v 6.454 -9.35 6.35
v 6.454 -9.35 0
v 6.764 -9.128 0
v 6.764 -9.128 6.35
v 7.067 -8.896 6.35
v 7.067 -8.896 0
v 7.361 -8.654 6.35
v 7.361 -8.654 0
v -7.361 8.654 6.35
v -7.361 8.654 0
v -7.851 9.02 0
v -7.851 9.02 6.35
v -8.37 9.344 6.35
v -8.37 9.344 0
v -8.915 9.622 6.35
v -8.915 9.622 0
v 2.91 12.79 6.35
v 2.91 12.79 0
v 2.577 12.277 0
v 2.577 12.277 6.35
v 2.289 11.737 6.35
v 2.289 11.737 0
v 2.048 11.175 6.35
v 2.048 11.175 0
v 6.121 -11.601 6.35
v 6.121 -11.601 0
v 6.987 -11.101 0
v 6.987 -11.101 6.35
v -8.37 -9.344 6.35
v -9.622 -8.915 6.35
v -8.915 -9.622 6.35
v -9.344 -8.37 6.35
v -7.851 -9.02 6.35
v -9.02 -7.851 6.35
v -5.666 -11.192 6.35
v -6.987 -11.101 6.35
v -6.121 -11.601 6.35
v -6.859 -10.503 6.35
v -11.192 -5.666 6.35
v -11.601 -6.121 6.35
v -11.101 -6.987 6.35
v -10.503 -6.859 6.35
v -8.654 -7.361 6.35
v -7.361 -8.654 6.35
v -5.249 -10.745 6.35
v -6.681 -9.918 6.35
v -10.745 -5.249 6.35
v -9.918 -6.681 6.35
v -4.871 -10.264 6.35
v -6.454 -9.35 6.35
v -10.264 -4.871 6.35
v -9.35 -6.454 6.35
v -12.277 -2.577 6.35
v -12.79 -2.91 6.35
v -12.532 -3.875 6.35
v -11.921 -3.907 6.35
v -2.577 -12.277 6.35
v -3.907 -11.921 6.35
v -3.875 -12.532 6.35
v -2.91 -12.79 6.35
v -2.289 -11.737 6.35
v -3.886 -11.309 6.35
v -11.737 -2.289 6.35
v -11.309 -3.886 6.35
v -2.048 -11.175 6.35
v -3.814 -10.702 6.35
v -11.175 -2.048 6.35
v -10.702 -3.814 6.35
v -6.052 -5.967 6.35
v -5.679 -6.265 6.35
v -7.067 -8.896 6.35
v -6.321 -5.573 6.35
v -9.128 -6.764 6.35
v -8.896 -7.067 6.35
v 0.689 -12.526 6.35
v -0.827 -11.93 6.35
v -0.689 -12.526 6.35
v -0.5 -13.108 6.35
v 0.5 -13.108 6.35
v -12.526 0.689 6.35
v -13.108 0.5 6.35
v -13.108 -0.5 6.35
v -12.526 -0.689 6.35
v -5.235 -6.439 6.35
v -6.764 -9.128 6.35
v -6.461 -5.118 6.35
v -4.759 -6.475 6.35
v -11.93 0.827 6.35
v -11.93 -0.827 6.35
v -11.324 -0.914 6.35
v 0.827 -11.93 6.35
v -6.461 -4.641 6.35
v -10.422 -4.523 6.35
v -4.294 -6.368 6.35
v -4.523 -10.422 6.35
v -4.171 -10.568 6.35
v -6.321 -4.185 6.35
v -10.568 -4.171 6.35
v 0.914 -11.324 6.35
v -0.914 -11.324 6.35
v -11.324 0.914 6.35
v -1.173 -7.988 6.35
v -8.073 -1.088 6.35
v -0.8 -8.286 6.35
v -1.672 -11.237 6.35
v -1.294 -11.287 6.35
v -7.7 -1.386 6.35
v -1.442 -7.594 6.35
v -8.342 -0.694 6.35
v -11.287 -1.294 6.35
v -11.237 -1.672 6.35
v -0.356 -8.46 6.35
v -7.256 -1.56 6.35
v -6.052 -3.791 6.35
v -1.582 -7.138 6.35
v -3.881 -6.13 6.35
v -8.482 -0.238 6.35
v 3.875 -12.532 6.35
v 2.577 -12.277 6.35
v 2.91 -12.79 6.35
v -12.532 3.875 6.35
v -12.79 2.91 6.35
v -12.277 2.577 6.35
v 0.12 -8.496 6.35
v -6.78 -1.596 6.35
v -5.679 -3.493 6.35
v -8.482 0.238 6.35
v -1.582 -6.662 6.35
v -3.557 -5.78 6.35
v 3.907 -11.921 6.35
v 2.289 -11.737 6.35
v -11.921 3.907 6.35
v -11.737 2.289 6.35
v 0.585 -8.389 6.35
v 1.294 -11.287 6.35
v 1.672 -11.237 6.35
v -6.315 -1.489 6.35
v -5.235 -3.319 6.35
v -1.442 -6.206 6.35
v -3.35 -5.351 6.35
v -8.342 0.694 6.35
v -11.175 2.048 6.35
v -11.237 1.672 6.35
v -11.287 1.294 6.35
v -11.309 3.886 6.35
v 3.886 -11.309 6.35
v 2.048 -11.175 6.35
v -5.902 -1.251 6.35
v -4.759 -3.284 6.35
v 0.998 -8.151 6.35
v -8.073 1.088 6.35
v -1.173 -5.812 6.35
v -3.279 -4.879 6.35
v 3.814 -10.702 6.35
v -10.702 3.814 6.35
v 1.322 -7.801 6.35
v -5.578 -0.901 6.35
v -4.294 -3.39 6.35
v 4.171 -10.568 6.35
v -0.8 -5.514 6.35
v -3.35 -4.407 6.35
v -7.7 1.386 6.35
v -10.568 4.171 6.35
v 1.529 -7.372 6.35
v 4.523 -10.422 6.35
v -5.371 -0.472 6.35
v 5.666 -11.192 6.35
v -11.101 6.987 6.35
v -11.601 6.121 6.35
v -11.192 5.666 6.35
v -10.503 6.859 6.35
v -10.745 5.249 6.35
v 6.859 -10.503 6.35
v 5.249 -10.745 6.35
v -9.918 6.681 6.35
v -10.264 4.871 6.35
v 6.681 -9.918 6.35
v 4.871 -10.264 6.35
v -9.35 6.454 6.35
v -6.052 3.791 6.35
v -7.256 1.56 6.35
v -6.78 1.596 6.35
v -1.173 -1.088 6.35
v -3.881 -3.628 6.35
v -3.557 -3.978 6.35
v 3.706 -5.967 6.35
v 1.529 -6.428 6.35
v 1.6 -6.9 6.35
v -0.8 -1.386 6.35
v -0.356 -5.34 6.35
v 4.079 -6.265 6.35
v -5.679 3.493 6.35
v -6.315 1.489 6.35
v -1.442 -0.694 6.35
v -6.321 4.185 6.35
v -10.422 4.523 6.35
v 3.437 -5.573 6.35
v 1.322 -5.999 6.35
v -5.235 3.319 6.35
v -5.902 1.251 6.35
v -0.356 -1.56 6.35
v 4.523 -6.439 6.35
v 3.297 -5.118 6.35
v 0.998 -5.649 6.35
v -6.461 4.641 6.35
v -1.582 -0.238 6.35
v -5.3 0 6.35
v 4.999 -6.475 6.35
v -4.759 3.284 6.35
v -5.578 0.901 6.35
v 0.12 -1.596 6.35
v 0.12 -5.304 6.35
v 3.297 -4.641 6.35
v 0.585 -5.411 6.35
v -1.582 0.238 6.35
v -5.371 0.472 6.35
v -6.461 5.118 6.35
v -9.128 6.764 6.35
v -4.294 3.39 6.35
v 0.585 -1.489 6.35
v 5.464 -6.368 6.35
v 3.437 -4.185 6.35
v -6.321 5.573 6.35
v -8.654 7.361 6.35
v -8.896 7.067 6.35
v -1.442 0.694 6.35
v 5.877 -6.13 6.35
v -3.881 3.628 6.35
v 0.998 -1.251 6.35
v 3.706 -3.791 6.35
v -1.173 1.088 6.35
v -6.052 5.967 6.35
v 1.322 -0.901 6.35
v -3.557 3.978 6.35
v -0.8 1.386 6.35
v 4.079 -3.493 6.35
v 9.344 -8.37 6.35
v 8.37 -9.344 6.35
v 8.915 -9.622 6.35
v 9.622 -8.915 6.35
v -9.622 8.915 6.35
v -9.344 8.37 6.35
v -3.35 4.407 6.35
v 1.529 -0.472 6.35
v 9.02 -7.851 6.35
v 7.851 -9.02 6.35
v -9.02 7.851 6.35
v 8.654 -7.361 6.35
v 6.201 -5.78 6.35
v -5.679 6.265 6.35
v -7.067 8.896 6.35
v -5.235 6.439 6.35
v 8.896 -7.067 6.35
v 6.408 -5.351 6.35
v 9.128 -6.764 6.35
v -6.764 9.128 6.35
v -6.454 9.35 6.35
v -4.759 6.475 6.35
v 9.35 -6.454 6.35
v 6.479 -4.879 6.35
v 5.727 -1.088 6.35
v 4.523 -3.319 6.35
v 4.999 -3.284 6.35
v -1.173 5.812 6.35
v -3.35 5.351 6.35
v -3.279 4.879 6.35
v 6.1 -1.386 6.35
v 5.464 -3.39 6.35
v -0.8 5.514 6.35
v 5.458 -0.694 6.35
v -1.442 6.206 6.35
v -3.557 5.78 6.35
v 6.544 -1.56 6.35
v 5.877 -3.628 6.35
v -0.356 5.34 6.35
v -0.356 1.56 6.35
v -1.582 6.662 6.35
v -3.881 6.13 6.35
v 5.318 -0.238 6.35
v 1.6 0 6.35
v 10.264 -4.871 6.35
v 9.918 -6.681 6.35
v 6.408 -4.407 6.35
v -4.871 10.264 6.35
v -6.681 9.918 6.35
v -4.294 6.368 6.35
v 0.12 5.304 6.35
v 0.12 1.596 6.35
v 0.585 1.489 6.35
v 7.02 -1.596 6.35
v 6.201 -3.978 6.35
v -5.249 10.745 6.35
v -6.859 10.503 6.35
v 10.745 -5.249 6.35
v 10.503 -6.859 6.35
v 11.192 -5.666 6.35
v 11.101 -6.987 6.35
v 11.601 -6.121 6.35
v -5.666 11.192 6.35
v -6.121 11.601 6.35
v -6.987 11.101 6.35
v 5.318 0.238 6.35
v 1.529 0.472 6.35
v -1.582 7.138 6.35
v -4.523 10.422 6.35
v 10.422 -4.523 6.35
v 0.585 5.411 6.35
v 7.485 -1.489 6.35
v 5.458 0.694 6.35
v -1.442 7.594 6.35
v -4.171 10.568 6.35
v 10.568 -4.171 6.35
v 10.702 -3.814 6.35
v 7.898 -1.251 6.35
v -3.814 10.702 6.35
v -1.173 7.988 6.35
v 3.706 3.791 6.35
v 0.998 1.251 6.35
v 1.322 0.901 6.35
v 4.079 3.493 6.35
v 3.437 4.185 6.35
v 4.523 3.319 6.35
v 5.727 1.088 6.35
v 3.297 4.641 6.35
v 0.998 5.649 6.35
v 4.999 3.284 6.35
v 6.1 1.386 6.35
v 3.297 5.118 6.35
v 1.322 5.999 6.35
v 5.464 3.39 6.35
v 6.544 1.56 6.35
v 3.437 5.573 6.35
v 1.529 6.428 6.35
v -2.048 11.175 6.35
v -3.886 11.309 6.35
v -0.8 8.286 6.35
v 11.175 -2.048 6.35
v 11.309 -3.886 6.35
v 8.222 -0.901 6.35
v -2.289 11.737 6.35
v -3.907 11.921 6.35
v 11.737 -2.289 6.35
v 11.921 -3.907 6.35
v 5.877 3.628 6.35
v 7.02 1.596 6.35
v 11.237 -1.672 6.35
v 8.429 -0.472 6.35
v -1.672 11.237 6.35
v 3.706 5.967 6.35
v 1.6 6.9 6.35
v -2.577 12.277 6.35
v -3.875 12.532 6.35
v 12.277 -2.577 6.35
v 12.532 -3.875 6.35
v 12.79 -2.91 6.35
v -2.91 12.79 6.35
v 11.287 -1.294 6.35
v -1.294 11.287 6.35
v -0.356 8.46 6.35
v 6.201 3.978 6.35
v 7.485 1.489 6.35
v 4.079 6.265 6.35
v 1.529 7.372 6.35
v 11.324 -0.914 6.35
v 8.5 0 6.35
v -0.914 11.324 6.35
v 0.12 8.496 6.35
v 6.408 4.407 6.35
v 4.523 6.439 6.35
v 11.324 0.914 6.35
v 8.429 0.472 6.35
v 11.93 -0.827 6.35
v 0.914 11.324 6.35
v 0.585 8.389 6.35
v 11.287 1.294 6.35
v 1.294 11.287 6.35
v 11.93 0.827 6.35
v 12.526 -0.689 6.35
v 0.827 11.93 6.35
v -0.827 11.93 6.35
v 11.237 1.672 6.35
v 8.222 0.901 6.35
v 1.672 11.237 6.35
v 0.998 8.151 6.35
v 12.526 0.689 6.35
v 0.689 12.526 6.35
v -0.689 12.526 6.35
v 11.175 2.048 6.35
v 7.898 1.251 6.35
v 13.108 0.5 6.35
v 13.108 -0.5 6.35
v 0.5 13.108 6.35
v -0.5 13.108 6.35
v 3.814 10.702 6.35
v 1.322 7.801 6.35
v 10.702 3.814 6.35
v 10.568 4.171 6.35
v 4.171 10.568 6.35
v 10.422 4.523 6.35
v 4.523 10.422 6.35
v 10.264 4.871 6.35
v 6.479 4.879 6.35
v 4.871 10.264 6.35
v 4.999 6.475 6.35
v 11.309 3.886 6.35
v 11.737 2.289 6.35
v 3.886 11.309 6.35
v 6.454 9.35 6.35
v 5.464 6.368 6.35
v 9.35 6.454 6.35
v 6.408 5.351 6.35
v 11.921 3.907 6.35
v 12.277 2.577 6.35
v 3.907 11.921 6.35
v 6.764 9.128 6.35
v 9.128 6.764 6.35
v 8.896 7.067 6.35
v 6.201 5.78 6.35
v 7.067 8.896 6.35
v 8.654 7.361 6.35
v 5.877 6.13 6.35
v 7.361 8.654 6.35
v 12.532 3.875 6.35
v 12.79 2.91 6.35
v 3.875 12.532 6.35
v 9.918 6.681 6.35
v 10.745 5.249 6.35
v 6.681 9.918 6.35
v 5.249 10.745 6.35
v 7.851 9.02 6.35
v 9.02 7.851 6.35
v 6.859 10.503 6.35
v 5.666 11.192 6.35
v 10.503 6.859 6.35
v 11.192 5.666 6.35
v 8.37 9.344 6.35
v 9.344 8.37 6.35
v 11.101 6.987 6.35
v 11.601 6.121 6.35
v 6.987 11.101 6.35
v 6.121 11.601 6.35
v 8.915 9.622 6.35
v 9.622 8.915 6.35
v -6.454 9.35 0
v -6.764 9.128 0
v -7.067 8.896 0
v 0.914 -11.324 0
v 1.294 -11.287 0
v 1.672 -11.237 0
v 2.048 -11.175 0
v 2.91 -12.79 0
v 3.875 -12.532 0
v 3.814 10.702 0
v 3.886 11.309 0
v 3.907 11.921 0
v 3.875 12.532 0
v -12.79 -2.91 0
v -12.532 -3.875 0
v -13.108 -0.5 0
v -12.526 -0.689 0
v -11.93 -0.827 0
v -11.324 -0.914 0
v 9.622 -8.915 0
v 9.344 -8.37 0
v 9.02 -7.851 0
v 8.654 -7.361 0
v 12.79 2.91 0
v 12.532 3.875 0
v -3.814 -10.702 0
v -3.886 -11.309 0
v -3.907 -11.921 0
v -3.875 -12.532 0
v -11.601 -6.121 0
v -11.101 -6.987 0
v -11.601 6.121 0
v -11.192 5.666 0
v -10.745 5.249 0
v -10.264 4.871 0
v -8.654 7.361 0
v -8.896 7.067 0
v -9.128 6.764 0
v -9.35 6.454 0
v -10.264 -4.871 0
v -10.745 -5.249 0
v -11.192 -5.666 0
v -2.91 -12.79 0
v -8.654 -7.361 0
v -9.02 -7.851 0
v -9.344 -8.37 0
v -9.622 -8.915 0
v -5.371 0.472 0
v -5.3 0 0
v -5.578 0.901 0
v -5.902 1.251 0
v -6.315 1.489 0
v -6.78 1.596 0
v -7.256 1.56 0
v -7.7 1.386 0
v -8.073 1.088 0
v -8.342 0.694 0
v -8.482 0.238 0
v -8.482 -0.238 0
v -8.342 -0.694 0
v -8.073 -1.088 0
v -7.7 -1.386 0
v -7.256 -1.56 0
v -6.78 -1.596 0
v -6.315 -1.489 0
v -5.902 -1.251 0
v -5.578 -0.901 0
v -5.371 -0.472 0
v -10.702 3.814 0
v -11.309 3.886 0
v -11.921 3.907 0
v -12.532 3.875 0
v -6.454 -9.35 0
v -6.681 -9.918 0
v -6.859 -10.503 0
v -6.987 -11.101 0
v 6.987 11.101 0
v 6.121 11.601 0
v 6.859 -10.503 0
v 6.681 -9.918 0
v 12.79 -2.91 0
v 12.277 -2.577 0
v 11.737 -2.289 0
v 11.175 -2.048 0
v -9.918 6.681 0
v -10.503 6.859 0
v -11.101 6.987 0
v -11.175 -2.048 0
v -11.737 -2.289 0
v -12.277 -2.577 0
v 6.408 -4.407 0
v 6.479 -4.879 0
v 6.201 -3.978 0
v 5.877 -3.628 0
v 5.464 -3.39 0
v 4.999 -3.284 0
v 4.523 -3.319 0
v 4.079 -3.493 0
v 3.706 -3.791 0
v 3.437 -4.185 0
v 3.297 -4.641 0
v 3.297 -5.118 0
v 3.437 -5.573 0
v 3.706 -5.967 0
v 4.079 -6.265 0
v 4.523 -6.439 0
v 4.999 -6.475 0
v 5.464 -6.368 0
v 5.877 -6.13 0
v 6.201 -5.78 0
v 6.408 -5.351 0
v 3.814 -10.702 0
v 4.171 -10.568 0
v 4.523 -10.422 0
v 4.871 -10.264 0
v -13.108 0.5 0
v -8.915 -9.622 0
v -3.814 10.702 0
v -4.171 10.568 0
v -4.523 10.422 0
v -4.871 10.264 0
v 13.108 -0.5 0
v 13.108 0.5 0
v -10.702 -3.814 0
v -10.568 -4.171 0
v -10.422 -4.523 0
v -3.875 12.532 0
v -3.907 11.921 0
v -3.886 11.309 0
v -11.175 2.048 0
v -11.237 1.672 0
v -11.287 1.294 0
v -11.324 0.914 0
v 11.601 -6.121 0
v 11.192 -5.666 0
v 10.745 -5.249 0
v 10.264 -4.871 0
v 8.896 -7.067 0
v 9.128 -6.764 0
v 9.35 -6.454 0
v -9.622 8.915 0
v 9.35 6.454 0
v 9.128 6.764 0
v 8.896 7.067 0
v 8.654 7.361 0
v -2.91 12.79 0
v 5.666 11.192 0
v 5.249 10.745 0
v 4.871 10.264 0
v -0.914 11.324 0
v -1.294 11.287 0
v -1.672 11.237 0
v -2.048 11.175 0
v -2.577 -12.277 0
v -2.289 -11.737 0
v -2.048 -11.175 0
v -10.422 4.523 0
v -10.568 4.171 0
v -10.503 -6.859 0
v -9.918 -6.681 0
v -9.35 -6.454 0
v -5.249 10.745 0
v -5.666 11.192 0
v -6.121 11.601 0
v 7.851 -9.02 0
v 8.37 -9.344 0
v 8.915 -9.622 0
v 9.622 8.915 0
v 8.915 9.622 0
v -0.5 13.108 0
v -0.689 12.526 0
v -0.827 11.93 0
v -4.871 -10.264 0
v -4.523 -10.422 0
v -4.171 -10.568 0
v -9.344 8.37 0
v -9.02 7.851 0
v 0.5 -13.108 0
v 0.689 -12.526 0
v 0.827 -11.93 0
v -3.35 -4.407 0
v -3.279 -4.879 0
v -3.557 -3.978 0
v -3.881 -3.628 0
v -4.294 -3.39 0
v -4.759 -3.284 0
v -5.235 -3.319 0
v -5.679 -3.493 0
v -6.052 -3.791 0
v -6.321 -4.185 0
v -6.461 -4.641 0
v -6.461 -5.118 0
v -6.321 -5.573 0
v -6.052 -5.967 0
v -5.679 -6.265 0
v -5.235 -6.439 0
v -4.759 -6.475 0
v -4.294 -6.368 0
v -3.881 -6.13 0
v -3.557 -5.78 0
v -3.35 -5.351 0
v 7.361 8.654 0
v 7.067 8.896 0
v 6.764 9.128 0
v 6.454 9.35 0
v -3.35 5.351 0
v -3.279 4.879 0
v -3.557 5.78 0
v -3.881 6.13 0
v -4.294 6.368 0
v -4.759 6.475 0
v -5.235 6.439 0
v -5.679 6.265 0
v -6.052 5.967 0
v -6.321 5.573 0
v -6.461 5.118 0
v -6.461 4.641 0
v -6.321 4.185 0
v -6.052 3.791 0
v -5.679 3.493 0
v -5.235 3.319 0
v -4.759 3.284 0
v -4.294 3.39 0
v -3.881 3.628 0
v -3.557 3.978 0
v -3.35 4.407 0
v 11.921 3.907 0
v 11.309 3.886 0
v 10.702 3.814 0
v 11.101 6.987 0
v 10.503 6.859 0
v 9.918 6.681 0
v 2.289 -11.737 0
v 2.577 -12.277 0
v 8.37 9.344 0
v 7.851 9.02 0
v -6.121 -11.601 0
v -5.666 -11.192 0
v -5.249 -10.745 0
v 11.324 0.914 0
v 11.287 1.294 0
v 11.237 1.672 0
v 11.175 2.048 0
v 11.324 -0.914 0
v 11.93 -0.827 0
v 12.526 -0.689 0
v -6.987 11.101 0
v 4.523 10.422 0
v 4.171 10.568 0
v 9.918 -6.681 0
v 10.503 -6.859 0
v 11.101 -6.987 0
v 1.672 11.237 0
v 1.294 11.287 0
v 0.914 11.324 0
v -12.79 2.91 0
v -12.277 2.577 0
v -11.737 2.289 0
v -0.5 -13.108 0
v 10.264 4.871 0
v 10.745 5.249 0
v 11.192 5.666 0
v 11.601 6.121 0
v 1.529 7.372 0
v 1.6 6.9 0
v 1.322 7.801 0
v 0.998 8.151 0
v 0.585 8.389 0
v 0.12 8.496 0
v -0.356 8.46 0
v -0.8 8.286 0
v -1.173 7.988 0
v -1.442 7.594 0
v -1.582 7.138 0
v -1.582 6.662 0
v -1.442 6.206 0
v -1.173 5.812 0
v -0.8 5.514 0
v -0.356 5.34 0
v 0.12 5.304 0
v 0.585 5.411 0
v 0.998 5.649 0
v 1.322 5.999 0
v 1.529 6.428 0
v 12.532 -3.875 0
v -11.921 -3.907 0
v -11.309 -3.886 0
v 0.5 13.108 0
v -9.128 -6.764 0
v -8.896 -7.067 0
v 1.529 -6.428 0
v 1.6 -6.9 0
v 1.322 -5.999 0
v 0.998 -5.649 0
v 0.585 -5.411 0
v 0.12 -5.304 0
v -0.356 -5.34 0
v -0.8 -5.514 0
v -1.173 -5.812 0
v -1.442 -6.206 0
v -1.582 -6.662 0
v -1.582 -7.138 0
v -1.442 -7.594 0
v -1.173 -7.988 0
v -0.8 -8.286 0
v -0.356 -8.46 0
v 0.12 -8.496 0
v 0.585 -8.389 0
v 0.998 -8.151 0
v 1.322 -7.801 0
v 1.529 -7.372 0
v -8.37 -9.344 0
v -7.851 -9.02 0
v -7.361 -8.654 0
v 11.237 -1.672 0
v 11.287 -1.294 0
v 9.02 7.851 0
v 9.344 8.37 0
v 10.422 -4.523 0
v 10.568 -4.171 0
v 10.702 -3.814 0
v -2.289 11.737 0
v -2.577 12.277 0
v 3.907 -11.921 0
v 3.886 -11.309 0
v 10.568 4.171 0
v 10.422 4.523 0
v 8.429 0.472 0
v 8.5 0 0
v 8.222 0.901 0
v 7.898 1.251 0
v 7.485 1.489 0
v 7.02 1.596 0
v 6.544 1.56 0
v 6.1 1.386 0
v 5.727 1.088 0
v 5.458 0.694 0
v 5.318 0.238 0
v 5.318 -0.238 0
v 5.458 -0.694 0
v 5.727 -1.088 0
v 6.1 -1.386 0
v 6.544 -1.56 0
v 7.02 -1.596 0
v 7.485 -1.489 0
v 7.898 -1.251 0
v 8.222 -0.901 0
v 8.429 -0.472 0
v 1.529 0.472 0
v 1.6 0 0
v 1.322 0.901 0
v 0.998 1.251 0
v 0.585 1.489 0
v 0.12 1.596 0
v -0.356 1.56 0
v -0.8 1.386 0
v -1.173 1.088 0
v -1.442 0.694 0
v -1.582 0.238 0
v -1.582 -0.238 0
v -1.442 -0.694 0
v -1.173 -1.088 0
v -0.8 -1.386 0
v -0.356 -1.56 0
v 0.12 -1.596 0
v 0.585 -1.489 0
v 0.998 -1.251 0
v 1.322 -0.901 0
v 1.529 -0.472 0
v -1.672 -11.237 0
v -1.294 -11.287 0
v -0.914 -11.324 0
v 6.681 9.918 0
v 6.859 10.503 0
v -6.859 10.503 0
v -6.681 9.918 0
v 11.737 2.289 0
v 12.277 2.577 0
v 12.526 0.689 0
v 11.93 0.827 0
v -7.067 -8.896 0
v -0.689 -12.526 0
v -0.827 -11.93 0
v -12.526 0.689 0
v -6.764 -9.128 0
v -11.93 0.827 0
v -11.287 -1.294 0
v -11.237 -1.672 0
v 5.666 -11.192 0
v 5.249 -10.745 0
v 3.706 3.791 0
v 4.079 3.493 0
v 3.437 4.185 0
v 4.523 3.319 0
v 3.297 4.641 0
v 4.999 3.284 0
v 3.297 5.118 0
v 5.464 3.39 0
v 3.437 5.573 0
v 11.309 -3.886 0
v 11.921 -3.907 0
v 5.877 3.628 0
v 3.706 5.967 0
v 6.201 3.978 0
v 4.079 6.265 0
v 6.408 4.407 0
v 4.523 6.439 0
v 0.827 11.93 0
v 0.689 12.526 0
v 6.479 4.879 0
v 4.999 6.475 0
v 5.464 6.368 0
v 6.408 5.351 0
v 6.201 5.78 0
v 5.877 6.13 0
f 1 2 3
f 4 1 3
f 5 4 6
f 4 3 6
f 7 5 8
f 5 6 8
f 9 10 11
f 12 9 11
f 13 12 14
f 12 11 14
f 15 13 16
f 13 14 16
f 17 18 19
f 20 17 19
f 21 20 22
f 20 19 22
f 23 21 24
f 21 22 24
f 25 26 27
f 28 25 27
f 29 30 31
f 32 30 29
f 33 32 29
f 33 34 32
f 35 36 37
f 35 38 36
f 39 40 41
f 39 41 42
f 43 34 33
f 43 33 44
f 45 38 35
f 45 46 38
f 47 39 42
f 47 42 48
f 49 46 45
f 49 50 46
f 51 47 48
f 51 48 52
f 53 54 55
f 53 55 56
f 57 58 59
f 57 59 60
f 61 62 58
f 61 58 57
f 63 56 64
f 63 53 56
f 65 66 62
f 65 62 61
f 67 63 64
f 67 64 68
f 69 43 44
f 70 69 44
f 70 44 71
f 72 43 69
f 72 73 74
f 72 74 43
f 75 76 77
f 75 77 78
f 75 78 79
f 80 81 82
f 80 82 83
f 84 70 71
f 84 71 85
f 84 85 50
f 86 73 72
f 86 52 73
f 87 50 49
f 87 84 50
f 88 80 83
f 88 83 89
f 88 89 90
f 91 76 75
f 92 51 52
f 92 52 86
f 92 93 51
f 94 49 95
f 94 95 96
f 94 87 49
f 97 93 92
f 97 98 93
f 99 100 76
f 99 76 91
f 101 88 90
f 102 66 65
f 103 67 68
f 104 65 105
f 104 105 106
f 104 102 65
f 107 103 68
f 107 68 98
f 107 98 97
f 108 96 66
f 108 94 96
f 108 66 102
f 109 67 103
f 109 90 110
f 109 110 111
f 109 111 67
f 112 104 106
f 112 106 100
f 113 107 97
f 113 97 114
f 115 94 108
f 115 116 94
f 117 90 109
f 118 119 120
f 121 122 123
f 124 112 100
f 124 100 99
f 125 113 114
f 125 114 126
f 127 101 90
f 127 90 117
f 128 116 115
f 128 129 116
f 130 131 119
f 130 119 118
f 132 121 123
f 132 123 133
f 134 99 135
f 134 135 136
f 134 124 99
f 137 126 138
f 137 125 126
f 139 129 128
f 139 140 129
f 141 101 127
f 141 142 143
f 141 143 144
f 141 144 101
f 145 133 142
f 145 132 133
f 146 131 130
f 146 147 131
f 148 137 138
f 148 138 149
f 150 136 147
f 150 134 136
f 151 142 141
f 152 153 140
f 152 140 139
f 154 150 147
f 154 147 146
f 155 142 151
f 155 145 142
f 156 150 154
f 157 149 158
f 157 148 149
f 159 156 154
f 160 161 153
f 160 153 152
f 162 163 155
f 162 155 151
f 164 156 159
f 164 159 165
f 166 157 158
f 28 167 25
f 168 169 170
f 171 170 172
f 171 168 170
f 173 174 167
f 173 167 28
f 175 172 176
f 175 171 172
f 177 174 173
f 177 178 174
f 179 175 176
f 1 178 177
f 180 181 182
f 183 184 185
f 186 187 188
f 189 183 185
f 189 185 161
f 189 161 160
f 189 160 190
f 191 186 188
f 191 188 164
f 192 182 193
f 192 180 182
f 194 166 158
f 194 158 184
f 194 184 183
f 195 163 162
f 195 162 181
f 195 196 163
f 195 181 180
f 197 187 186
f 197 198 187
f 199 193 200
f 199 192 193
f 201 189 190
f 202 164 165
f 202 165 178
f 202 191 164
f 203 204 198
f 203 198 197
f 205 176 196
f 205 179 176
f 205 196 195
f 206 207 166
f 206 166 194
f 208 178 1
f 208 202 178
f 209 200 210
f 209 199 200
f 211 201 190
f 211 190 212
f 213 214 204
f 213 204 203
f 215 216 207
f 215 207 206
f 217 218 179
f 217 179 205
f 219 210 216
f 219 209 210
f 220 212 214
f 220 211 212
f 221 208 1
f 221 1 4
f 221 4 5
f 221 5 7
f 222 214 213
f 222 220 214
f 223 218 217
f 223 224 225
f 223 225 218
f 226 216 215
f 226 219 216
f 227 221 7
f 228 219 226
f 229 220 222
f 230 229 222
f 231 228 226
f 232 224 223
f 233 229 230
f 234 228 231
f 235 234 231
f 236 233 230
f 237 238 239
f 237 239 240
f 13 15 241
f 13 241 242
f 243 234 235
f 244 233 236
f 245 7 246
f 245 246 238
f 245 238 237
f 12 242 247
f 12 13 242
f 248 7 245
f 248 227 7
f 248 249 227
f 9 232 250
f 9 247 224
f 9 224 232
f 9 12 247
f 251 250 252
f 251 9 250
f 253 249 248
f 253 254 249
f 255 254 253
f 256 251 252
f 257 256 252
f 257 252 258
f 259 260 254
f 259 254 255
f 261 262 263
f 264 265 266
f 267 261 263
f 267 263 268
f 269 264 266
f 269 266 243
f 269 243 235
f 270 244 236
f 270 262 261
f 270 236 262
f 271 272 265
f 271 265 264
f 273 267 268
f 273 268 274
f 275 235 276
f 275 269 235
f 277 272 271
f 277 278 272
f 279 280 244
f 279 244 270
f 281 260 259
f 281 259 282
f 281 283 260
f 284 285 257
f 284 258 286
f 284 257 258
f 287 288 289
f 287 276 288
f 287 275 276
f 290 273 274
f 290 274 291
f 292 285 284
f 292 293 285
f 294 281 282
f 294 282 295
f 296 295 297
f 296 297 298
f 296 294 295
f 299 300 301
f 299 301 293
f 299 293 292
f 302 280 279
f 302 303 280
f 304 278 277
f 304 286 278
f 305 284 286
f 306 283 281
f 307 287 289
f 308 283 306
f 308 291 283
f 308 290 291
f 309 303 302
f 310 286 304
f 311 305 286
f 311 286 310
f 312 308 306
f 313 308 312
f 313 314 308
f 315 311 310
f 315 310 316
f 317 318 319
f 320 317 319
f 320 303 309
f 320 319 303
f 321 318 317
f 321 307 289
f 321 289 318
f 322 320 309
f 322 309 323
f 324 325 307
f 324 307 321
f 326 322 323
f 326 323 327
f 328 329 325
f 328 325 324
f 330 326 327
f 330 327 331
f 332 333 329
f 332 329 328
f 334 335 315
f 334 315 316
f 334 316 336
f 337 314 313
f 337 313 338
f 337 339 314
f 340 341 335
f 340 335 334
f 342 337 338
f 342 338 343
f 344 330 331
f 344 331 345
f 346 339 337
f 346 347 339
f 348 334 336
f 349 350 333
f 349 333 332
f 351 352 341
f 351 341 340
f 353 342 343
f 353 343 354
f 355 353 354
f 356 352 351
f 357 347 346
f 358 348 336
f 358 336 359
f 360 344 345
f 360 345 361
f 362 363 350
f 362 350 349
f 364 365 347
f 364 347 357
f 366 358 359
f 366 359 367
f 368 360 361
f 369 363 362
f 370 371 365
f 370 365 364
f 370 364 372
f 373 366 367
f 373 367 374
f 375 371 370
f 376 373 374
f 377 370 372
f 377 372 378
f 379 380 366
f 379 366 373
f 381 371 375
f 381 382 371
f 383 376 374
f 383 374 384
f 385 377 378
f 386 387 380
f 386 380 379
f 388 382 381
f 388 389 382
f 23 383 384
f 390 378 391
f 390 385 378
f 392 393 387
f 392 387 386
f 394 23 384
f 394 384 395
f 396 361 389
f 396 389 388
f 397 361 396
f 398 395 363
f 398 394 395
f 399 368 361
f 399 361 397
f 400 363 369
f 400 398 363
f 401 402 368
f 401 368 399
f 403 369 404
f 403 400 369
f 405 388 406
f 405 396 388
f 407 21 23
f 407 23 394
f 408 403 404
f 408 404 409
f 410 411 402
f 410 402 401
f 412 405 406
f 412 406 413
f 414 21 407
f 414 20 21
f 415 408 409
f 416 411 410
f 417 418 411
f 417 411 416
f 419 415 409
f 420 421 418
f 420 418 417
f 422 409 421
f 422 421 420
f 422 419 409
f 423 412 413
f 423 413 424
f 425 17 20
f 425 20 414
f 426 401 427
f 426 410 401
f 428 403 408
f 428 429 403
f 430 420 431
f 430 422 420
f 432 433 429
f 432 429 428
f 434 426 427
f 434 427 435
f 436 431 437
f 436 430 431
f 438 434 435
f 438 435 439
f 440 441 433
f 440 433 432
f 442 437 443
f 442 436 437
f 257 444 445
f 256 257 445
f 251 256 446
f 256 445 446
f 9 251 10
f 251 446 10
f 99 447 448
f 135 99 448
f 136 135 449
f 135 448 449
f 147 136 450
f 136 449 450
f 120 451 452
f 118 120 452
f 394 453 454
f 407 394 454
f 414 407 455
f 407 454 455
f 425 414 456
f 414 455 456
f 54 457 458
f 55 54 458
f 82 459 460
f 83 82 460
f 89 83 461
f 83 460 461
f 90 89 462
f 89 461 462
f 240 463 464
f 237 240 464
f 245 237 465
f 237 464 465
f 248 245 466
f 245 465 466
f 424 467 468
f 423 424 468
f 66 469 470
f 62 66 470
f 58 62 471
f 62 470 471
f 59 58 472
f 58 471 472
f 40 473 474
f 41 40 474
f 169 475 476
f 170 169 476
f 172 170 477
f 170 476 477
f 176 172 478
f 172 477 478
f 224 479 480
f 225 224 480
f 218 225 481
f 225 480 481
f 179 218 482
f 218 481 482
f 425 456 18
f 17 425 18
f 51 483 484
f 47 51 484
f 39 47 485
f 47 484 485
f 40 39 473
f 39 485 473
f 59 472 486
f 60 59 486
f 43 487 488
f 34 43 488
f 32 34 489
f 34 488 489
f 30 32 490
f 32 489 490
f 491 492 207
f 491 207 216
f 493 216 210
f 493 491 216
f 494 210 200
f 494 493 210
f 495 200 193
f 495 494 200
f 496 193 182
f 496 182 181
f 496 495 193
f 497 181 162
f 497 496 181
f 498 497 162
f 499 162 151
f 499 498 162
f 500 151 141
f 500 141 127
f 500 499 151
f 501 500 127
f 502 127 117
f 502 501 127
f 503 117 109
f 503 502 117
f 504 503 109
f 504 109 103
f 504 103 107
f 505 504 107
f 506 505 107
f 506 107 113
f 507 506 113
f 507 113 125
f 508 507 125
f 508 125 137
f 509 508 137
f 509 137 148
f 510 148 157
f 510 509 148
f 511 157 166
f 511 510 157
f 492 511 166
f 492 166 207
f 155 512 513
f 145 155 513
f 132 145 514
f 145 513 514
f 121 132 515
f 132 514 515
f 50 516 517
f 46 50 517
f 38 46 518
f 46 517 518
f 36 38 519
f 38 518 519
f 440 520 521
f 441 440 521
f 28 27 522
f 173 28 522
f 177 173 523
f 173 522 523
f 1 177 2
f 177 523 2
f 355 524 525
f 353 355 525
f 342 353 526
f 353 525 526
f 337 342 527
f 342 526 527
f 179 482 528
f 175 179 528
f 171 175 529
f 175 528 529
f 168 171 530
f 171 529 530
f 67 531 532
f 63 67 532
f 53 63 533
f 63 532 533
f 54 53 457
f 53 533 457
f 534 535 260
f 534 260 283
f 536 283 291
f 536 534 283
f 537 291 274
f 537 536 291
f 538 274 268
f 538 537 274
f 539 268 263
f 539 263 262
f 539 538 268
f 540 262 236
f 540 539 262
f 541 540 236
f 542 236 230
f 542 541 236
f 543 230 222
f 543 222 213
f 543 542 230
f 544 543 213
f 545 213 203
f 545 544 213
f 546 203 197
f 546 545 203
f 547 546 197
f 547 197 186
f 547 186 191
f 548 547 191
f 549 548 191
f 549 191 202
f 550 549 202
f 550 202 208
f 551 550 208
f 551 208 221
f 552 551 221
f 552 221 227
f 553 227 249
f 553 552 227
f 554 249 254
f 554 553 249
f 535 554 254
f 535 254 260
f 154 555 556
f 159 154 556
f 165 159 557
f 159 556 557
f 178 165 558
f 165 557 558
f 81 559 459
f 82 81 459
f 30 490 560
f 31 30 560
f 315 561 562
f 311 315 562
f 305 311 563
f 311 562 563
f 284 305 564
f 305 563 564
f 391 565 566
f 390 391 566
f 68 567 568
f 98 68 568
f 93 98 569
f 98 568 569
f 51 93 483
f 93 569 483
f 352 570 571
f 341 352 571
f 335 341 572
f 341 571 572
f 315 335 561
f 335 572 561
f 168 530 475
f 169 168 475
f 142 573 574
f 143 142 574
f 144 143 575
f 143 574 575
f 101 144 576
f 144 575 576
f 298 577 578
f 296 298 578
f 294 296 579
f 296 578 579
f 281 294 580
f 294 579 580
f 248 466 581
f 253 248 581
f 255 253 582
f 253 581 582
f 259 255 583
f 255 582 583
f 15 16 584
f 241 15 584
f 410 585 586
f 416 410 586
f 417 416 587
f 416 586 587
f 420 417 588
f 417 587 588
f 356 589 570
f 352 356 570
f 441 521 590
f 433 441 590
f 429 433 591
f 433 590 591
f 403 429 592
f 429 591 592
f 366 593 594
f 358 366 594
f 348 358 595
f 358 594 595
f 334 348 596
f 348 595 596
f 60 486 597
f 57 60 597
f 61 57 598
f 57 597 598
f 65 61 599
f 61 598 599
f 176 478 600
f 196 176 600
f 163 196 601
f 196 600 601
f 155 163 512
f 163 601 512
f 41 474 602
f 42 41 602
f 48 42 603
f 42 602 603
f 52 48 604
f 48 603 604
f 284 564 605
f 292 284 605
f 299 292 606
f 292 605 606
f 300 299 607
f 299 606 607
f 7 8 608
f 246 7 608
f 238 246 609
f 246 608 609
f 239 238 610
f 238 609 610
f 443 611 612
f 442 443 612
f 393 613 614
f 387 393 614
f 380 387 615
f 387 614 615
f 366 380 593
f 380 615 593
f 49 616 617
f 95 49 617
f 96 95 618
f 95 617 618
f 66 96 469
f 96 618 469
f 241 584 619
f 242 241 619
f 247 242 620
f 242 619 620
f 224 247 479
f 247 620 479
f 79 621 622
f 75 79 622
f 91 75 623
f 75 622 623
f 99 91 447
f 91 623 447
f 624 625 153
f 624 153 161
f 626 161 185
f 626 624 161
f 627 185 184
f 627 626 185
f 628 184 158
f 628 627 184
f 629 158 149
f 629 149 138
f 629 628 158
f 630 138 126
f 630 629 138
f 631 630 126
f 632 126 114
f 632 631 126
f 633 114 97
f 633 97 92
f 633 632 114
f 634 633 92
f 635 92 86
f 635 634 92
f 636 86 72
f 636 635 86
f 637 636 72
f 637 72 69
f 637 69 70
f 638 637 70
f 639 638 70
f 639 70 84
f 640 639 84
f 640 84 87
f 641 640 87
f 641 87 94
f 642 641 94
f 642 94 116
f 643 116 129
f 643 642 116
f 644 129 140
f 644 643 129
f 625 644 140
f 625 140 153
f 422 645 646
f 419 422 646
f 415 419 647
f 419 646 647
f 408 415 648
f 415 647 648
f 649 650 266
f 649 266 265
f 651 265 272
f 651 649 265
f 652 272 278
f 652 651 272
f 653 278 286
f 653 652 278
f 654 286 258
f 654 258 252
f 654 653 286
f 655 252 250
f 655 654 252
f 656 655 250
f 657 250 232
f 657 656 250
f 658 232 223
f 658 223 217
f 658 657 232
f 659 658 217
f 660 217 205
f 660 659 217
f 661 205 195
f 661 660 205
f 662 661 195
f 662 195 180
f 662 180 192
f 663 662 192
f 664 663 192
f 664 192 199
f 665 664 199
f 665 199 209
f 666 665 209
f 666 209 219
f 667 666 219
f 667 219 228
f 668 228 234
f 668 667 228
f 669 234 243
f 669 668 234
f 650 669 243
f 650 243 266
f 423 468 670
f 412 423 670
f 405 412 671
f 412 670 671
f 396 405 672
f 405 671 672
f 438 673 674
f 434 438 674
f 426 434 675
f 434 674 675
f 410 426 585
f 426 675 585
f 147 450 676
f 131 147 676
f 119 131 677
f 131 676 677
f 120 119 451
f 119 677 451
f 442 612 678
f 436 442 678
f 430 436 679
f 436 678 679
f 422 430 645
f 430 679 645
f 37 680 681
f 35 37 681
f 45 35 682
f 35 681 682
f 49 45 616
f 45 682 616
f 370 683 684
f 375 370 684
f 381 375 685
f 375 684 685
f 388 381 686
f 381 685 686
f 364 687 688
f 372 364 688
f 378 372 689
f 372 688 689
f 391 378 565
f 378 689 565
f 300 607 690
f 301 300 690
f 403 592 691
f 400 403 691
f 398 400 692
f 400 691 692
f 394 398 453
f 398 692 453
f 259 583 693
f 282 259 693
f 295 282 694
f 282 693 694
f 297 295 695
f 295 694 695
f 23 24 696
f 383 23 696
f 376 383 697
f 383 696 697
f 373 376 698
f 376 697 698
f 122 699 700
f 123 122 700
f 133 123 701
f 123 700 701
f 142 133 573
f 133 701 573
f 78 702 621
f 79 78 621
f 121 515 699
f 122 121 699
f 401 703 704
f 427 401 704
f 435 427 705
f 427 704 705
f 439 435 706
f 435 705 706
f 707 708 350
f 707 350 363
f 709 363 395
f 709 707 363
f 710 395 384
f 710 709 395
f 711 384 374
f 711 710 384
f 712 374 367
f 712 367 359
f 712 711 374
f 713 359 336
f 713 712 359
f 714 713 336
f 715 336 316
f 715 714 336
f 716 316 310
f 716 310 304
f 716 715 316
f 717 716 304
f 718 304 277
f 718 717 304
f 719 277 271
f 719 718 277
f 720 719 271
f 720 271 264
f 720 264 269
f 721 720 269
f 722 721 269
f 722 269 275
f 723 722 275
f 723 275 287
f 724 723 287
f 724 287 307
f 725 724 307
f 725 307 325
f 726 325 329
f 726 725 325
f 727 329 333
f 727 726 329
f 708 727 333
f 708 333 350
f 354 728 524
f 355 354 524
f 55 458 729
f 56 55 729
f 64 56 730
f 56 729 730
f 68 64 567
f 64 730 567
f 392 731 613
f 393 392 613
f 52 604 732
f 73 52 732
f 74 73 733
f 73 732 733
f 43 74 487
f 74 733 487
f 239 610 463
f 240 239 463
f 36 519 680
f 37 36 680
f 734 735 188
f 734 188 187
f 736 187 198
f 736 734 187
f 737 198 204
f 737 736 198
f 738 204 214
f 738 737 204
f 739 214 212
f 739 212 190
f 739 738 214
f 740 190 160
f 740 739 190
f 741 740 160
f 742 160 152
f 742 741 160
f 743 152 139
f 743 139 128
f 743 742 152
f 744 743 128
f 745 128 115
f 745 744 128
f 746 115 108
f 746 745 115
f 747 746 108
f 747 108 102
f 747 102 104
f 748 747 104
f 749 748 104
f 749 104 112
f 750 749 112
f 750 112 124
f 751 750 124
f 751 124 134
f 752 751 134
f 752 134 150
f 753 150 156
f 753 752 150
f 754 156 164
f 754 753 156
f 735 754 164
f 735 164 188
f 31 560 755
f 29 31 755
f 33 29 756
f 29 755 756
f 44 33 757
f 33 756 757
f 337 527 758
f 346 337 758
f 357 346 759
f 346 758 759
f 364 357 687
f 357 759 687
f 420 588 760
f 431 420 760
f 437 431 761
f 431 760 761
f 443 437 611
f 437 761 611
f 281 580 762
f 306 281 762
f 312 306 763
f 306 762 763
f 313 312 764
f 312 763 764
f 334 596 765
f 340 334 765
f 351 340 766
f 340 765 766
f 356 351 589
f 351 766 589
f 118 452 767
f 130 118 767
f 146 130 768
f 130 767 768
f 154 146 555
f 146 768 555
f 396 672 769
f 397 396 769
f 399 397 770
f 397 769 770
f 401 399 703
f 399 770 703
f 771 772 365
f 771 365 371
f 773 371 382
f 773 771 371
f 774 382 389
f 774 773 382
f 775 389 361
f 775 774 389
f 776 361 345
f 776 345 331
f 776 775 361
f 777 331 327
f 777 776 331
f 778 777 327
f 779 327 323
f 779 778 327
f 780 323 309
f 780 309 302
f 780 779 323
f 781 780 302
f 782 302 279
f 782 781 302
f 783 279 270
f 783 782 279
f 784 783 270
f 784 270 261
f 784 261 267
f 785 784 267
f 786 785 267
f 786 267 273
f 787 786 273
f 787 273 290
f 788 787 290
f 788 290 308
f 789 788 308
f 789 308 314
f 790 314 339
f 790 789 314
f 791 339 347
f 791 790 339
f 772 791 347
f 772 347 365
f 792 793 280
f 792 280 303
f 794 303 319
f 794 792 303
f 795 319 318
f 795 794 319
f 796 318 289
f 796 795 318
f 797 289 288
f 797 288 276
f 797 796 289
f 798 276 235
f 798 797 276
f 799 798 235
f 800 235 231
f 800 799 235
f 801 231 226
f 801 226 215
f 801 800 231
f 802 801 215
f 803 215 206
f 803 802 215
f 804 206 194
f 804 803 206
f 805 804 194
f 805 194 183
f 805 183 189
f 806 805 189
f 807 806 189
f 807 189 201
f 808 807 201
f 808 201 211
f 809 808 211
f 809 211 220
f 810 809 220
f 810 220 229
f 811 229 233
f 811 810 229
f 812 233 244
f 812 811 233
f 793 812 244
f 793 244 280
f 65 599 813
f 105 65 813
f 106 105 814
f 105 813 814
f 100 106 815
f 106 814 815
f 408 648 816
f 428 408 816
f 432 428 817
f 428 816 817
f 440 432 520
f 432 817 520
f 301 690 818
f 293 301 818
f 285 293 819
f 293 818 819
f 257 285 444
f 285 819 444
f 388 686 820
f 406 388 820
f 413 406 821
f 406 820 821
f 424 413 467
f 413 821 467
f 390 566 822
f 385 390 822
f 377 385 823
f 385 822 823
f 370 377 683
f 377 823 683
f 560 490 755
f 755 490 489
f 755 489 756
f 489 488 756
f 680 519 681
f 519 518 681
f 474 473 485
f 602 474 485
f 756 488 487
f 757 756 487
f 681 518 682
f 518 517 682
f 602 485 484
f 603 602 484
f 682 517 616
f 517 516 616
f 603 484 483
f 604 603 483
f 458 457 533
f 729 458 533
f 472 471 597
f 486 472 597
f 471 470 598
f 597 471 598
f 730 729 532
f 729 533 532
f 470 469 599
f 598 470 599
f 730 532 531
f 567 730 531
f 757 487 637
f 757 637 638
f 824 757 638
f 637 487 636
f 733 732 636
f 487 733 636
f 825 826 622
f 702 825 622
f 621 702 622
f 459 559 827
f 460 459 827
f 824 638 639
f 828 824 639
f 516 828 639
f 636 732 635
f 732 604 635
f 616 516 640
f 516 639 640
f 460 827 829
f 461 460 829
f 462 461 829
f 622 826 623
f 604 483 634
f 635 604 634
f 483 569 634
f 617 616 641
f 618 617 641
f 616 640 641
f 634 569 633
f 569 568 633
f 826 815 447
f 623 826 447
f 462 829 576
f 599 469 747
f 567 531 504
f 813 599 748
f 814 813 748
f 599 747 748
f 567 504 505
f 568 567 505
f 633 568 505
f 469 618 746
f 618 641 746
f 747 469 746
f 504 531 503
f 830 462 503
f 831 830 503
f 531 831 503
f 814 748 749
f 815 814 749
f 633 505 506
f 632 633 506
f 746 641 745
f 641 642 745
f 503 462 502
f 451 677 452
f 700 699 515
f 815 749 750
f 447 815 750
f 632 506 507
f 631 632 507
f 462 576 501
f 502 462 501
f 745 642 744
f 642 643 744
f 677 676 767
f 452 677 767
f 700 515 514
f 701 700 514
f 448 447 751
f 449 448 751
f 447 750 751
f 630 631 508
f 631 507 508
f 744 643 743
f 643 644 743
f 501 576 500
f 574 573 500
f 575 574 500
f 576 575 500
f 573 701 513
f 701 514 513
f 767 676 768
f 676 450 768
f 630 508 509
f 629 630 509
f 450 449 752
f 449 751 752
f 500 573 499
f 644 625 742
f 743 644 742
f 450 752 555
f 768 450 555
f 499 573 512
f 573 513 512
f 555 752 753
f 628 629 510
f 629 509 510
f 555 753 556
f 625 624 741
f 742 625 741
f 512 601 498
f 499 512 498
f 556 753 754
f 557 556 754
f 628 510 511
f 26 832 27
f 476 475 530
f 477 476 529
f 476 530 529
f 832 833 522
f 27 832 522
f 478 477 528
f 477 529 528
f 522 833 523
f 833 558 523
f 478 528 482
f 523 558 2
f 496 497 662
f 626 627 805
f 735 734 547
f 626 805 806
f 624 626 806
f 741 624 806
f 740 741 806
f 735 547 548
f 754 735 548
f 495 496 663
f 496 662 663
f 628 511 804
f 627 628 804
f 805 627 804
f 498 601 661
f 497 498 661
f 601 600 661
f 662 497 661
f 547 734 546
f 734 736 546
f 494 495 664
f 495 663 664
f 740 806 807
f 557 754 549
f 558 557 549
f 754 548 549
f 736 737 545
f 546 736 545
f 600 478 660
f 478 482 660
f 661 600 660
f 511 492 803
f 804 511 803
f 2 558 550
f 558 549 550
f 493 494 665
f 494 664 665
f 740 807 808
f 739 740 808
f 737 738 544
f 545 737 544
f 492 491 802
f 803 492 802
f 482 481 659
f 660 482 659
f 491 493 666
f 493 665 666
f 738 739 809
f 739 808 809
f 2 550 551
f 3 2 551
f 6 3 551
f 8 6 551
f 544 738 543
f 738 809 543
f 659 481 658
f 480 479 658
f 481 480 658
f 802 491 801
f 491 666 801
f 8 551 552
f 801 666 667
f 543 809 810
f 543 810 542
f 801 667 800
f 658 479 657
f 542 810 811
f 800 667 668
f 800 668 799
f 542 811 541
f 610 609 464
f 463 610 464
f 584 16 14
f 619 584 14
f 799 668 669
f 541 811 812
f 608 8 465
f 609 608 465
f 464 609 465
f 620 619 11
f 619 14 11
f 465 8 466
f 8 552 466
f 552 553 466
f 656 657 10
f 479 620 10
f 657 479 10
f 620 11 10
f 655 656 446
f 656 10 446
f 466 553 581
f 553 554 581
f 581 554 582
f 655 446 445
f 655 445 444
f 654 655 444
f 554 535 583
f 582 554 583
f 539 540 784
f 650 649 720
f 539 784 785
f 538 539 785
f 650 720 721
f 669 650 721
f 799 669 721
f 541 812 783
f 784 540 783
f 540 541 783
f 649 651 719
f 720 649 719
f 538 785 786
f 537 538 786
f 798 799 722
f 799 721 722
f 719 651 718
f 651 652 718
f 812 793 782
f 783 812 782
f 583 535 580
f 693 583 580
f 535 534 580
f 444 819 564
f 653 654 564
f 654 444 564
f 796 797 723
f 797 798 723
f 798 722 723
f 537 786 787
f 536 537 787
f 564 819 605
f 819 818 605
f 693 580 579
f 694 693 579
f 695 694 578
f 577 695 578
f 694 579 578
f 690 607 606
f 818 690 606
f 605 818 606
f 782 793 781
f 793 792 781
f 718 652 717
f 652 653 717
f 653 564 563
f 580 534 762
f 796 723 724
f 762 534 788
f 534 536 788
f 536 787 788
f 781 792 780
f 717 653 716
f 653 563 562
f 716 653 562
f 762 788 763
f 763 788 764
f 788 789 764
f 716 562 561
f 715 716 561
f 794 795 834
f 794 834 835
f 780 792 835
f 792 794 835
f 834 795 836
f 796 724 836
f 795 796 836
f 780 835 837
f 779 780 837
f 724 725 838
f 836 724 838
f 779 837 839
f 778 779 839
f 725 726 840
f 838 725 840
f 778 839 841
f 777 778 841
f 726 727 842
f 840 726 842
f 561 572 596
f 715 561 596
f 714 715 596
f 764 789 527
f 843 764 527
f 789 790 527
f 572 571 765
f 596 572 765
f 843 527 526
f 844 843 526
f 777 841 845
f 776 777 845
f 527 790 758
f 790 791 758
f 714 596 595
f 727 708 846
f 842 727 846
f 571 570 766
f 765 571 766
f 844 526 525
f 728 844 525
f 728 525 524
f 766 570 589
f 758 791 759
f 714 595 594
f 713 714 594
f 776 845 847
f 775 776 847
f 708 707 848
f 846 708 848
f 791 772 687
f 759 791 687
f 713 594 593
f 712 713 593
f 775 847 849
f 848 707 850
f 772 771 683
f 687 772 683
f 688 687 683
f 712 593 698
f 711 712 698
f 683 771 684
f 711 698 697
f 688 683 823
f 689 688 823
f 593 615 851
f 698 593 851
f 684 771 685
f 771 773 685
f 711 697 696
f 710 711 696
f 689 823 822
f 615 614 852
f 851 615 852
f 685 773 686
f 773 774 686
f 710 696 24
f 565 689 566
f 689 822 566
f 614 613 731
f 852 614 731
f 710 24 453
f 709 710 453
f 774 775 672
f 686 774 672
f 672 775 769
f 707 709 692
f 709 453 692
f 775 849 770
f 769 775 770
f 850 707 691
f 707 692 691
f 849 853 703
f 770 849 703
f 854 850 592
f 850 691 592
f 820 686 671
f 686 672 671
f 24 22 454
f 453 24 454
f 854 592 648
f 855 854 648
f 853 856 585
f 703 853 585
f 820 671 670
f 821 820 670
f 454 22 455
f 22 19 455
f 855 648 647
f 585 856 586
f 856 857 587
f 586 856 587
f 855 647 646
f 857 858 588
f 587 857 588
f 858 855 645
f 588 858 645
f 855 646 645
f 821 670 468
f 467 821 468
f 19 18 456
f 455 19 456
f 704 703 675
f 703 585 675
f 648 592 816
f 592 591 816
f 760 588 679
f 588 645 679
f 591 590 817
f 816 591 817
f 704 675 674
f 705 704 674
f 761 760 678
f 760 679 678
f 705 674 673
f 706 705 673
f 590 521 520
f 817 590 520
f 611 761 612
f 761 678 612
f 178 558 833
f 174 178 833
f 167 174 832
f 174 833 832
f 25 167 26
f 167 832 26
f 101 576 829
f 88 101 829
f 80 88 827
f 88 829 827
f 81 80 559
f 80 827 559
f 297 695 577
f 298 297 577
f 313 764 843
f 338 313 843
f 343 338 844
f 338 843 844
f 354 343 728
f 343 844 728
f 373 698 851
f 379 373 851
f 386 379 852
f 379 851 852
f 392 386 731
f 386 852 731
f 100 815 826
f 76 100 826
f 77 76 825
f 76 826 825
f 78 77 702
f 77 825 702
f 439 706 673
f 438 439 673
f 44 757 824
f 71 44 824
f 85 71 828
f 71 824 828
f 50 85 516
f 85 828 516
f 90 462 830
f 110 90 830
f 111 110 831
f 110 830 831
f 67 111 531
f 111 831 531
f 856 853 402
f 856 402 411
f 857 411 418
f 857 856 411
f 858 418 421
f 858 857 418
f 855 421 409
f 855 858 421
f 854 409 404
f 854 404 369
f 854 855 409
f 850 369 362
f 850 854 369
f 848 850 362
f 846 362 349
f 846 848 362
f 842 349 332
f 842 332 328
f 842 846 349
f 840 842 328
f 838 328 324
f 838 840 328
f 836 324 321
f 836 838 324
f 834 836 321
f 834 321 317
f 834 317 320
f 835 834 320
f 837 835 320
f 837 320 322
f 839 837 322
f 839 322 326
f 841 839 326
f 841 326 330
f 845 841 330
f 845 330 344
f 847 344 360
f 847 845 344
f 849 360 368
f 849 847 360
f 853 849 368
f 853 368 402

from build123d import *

# Parameters (mm, degrees)
F0_R     = 1.6
F1_DEPTH = 6.35


with BuildPart() as f1:
    # F0 (on Top) → F1 (new body)
    with BuildSketch(Plane.XY):
        with BuildLine():
            Line((0.5, 13.107544), (-0.5, 13.107544))
            ThreePointArc((-0.5, 13.107544), (-0.764193, 12.229191), (-0.914082, 11.324295))
            ThreePointArc((-0.914082, 11.324295), (-1.482925, 11.263931), (-2.048008, 11.175011))
            ThreePointArc((-2.048008, 11.175011), (-2.426993, 12.010279), (-2.909519, 12.790325))
            Line((-2.909519, 12.790325), (-3.875445, 12.531506))
            ThreePointArc((-3.875445, 12.531506), (-3.903302, 11.614704), (-3.813879, 10.701847))
            ThreePointArc((-3.813879, 10.701847), (-4.347715, 10.496313), (-4.870529, 10.264168))
            ThreePointArc((-4.870529, 10.264168), (-5.452785, 10.972887), (-6.12076, 11.601467))
            Line((-6.12076, 11.601467), (-6.986785, 11.101467))
            ThreePointArc((-6.986785, 11.101467), (-6.776406, 10.208693), (-6.453766, 9.350086))
            ThreePointArc((-6.453766, 9.350086), (-6.916216, 9.013388), (-7.361132, 8.65384))
            ThreePointArc((-7.361132, 8.65384), (-8.106978, 9.18771), (-8.91488, 9.621987))
            Line((-8.91488, 9.621987), (-9.621987, 8.91488))
            ThreePointArc((-9.621987, 8.91488), (-9.18771, 8.106978), (-8.65384, 7.361132))
            ThreePointArc((-8.65384, 7.361132), (-9.013388, 6.916216), (-9.350086, 6.453766))
            ThreePointArc((-9.350086, 6.453766), (-10.208693, 6.776406), (-11.101467, 6.986785))
            Line((-11.101467, 6.986785), (-11.601467, 6.12076))
            ThreePointArc((-11.601467, 6.12076), (-10.972887, 5.452785), (-10.264168, 4.870529))
            ThreePointArc((-10.264168, 4.870529), (-10.496313, 4.347715), (-10.701847, 3.813879))
            ThreePointArc((-10.701847, 3.813879), (-11.614704, 3.903302), (-12.531506, 3.875445))
            Line((-12.531506, 3.875445), (-12.790325, 2.909519))
            ThreePointArc((-12.790325, 2.909519), (-12.010279, 2.426993), (-11.175011, 2.048008))
            ThreePointArc((-11.175011, 2.048008), (-11.263931, 1.482925), (-11.324295, 0.914082))
            ThreePointArc((-11.324295, 0.914082), (-12.229191, 0.764193), (-13.107544, 0.5))
            Line((-13.107544, 0.5), (-13.107544, -0.5))
            ThreePointArc((-13.107544, -0.5), (-12.229191, -0.764193), (-11.324295, -0.914082))
            ThreePointArc((-11.324295, -0.914082), (-11.263931, -1.482925), (-11.175011, -2.048008))
            ThreePointArc((-11.175011, -2.048008), (-12.010279, -2.426993), (-12.790325, -2.909519))
            Line((-12.790325, -2.909519), (-12.531506, -3.875445))
            ThreePointArc((-12.531506, -3.875445), (-11.614704, -3.903302), (-10.701847, -3.813879))
            ThreePointArc((-10.701847, -3.813879), (-10.496313, -4.347715), (-10.264168, -4.870529))
            ThreePointArc((-10.264168, -4.870529), (-10.972887, -5.452785), (-11.601467, -6.12076))
            Line((-11.601467, -6.12076), (-11.101467, -6.986785))
            ThreePointArc((-11.101467, -6.986785), (-10.208693, -6.776406), (-9.350086, -6.453766))
            ThreePointArc((-9.350086, -6.453766), (-9.013388, -6.916216), (-8.65384, -7.361132))
            ThreePointArc((-8.65384, -7.361132), (-9.18771, -8.106978), (-9.621987, -8.91488))
            Line((-9.621987, -8.91488), (-8.91488, -9.621987))
            ThreePointArc((-8.91488, -9.621987), (-8.106978, -9.18771), (-7.361132, -8.65384))
            ThreePointArc((-7.361132, -8.65384), (-6.916216, -9.013388), (-6.453766, -9.350086))
            ThreePointArc((-6.453766, -9.350086), (-6.776406, -10.208693), (-6.986785, -11.101467))
            Line((-6.986785, -11.101467), (-6.12076, -11.601467))
            ThreePointArc((-6.12076, -11.601467), (-5.452785, -10.972887), (-4.870529, -10.264168))
            ThreePointArc((-4.870529, -10.264168), (-4.347715, -10.496313), (-3.813879, -10.701847))
            ThreePointArc((-3.813879, -10.701847), (-3.903302, -11.614704), (-3.875445, -12.531506))
            Line((-3.875445, -12.531506), (-2.909519, -12.790325))
            ThreePointArc((-2.909519, -12.790325), (-2.426993, -12.010279), (-2.048008, -11.175011))
            ThreePointArc((-2.048008, -11.175011), (-1.482925, -11.263931), (-0.914082, -11.324295))
            ThreePointArc((-0.914082, -11.324295), (-0.764193, -12.229191), (-0.5, -13.107544))
            Line((-0.5, -13.107544), (0.5, -13.107544))
            ThreePointArc((0.5, -13.107544), (0.764193, -12.229191), (0.914082, -11.324295))
            ThreePointArc((0.914082, -11.324295), (1.482925, -11.263931), (2.048008, -11.175011))
            ThreePointArc((2.048008, -11.175011), (2.426993, -12.010279), (2.909519, -12.790325))
            Line((2.909519, -12.790325), (3.875445, -12.531506))
            ThreePointArc((3.875445, -12.531506), (3.903302, -11.614704), (3.813879, -10.701847))
            ThreePointArc((3.813879, -10.701847), (4.347715, -10.496313), (4.870529, -10.264168))
            ThreePointArc((4.870529, -10.264168), (5.452785, -10.972887), (6.12076, -11.601467))
            Line((6.12076, -11.601467), (6.986785, -11.101467))
            ThreePointArc((6.986785, -11.101467), (6.776406, -10.208693), (6.453766, -9.350086))
            ThreePointArc((6.453766, -9.350086), (6.916216, -9.013388), (7.361132, -8.65384))
            ThreePointArc((7.361132, -8.65384), (8.106978, -9.18771), (8.91488, -9.621987))
            Line((8.91488, -9.621987), (9.621987, -8.91488))
            ThreePointArc((9.621987, -8.91488), (9.18771, -8.106978), (8.65384, -7.361132))
            ThreePointArc((8.65384, -7.361132), (9.013388, -6.916216), (9.350086, -6.453766))
            ThreePointArc((9.350086, -6.453766), (10.208693, -6.776406), (11.101467, -6.986785))
            Line((11.101467, -6.986785), (11.601467, -6.12076))
            ThreePointArc((11.601467, -6.12076), (10.972887, -5.452785), (10.264168, -4.870529))
            ThreePointArc((10.264168, -4.870529), (10.496313, -4.347715), (10.701847, -3.813879))
            ThreePointArc((10.701847, -3.813879), (11.614704, -3.903302), (12.531506, -3.875445))
            Line((12.531506, -3.875445), (12.790325, -2.909519))
            ThreePointArc((12.790325, -2.909519), (12.010279, -2.426993), (11.175011, -2.048008))
            ThreePointArc((11.175011, -2.048008), (11.263931, -1.482925), (11.324295, -0.914082))
            ThreePointArc((11.324295, -0.914082), (12.229191, -0.764193), (13.107544, -0.5))
            Line((13.107544, -0.5), (13.107544, 0.5))
            ThreePointArc((13.107544, 0.5), (12.229191, 0.764193), (11.324295, 0.914082))
            ThreePointArc((11.324295, 0.914082), (11.263931, 1.482925), (11.175011, 2.048008))
            ThreePointArc((11.175011, 2.048008), (12.010279, 2.426993), (12.790325, 2.909519))
            Line((12.790325, 2.909519), (12.531506, 3.875445))
            ThreePointArc((12.531506, 3.875445), (11.614704, 3.903302), (10.701847, 3.813879))
            ThreePointArc((10.701847, 3.813879), (10.496313, 4.347715), (10.264168, 4.870529))
            ThreePointArc((10.264168, 4.870529), (10.972887, 5.452785), (11.601467, 6.12076))
            Line((11.601467, 6.12076), (11.101467, 6.986785))
            ThreePointArc((11.101467, 6.986785), (10.208693, 6.776406), (9.350086, 6.453766))
            ThreePointArc((9.350086, 6.453766), (9.013388, 6.916216), (8.65384, 7.361132))
            ThreePointArc((8.65384, 7.361132), (9.18771, 8.106978), (9.621987, 8.91488))
            Line((9.621987, 8.91488), (8.91488, 9.621987))
            ThreePointArc((8.91488, 9.621987), (8.106978, 9.18771), (7.361132, 8.65384))
            ThreePointArc((7.361132, 8.65384), (6.916216, 9.013388), (6.453766, 9.350086))
            ThreePointArc((6.453766, 9.350086), (6.776406, 10.208693), (6.986785, 11.101467))
            Line((6.986785, 11.101467), (6.12076, 11.601467))
            ThreePointArc((6.12076, 11.601467), (5.452785, 10.972887), (4.870529, 10.264168))
            ThreePointArc((4.870529, 10.264168), (4.347715, 10.496313), (3.813879, 10.701847))
            ThreePointArc((3.813879, 10.701847), (3.903302, 11.614704), (3.875445, 12.531506))
            Line((3.875445, 12.531506), (2.909519, 12.790325))
            ThreePointArc((2.909519, 12.790325), (2.426993, 12.010279), (2.048008, 11.175011))
            ThreePointArc((2.048008, 11.175011), (1.482925, 11.263931), (0.914082, 11.324295))
            ThreePointArc((0.914082, 11.324295), (0.764193, 12.229191), (0.5, 13.107544))
        make_face()
        with Locations((-4.879037, -4.879037)):
            Circle(F0_R, mode=Mode.SUBTRACT)
        with Locations((0, -6.9)):
            Circle(F0_R, mode=Mode.SUBTRACT)
        with Locations((4.879037, -4.879037)):
            Circle(F0_R, mode=Mode.SUBTRACT)
        with Locations((-6.9, 0)):
            Circle(F0_R, mode=Mode.SUBTRACT)
        with Locations((-4.879037, 4.879037)):
            Circle(F0_R, mode=Mode.SUBTRACT)
        Circle(F0_R, mode=Mode.SUBTRACT)
        with Locations((4.879037, 4.879037)):
            Circle(F0_R, mode=Mode.SUBTRACT)
        with Locations((6.9, 0)):
            Circle(F0_R, mode=Mode.SUBTRACT)
        with Locations((0, 6.9)):
            Circle(F0_R, mode=Mode.SUBTRACT)
    extrude(amount=F1_DEPTH)


solid = f1.part
